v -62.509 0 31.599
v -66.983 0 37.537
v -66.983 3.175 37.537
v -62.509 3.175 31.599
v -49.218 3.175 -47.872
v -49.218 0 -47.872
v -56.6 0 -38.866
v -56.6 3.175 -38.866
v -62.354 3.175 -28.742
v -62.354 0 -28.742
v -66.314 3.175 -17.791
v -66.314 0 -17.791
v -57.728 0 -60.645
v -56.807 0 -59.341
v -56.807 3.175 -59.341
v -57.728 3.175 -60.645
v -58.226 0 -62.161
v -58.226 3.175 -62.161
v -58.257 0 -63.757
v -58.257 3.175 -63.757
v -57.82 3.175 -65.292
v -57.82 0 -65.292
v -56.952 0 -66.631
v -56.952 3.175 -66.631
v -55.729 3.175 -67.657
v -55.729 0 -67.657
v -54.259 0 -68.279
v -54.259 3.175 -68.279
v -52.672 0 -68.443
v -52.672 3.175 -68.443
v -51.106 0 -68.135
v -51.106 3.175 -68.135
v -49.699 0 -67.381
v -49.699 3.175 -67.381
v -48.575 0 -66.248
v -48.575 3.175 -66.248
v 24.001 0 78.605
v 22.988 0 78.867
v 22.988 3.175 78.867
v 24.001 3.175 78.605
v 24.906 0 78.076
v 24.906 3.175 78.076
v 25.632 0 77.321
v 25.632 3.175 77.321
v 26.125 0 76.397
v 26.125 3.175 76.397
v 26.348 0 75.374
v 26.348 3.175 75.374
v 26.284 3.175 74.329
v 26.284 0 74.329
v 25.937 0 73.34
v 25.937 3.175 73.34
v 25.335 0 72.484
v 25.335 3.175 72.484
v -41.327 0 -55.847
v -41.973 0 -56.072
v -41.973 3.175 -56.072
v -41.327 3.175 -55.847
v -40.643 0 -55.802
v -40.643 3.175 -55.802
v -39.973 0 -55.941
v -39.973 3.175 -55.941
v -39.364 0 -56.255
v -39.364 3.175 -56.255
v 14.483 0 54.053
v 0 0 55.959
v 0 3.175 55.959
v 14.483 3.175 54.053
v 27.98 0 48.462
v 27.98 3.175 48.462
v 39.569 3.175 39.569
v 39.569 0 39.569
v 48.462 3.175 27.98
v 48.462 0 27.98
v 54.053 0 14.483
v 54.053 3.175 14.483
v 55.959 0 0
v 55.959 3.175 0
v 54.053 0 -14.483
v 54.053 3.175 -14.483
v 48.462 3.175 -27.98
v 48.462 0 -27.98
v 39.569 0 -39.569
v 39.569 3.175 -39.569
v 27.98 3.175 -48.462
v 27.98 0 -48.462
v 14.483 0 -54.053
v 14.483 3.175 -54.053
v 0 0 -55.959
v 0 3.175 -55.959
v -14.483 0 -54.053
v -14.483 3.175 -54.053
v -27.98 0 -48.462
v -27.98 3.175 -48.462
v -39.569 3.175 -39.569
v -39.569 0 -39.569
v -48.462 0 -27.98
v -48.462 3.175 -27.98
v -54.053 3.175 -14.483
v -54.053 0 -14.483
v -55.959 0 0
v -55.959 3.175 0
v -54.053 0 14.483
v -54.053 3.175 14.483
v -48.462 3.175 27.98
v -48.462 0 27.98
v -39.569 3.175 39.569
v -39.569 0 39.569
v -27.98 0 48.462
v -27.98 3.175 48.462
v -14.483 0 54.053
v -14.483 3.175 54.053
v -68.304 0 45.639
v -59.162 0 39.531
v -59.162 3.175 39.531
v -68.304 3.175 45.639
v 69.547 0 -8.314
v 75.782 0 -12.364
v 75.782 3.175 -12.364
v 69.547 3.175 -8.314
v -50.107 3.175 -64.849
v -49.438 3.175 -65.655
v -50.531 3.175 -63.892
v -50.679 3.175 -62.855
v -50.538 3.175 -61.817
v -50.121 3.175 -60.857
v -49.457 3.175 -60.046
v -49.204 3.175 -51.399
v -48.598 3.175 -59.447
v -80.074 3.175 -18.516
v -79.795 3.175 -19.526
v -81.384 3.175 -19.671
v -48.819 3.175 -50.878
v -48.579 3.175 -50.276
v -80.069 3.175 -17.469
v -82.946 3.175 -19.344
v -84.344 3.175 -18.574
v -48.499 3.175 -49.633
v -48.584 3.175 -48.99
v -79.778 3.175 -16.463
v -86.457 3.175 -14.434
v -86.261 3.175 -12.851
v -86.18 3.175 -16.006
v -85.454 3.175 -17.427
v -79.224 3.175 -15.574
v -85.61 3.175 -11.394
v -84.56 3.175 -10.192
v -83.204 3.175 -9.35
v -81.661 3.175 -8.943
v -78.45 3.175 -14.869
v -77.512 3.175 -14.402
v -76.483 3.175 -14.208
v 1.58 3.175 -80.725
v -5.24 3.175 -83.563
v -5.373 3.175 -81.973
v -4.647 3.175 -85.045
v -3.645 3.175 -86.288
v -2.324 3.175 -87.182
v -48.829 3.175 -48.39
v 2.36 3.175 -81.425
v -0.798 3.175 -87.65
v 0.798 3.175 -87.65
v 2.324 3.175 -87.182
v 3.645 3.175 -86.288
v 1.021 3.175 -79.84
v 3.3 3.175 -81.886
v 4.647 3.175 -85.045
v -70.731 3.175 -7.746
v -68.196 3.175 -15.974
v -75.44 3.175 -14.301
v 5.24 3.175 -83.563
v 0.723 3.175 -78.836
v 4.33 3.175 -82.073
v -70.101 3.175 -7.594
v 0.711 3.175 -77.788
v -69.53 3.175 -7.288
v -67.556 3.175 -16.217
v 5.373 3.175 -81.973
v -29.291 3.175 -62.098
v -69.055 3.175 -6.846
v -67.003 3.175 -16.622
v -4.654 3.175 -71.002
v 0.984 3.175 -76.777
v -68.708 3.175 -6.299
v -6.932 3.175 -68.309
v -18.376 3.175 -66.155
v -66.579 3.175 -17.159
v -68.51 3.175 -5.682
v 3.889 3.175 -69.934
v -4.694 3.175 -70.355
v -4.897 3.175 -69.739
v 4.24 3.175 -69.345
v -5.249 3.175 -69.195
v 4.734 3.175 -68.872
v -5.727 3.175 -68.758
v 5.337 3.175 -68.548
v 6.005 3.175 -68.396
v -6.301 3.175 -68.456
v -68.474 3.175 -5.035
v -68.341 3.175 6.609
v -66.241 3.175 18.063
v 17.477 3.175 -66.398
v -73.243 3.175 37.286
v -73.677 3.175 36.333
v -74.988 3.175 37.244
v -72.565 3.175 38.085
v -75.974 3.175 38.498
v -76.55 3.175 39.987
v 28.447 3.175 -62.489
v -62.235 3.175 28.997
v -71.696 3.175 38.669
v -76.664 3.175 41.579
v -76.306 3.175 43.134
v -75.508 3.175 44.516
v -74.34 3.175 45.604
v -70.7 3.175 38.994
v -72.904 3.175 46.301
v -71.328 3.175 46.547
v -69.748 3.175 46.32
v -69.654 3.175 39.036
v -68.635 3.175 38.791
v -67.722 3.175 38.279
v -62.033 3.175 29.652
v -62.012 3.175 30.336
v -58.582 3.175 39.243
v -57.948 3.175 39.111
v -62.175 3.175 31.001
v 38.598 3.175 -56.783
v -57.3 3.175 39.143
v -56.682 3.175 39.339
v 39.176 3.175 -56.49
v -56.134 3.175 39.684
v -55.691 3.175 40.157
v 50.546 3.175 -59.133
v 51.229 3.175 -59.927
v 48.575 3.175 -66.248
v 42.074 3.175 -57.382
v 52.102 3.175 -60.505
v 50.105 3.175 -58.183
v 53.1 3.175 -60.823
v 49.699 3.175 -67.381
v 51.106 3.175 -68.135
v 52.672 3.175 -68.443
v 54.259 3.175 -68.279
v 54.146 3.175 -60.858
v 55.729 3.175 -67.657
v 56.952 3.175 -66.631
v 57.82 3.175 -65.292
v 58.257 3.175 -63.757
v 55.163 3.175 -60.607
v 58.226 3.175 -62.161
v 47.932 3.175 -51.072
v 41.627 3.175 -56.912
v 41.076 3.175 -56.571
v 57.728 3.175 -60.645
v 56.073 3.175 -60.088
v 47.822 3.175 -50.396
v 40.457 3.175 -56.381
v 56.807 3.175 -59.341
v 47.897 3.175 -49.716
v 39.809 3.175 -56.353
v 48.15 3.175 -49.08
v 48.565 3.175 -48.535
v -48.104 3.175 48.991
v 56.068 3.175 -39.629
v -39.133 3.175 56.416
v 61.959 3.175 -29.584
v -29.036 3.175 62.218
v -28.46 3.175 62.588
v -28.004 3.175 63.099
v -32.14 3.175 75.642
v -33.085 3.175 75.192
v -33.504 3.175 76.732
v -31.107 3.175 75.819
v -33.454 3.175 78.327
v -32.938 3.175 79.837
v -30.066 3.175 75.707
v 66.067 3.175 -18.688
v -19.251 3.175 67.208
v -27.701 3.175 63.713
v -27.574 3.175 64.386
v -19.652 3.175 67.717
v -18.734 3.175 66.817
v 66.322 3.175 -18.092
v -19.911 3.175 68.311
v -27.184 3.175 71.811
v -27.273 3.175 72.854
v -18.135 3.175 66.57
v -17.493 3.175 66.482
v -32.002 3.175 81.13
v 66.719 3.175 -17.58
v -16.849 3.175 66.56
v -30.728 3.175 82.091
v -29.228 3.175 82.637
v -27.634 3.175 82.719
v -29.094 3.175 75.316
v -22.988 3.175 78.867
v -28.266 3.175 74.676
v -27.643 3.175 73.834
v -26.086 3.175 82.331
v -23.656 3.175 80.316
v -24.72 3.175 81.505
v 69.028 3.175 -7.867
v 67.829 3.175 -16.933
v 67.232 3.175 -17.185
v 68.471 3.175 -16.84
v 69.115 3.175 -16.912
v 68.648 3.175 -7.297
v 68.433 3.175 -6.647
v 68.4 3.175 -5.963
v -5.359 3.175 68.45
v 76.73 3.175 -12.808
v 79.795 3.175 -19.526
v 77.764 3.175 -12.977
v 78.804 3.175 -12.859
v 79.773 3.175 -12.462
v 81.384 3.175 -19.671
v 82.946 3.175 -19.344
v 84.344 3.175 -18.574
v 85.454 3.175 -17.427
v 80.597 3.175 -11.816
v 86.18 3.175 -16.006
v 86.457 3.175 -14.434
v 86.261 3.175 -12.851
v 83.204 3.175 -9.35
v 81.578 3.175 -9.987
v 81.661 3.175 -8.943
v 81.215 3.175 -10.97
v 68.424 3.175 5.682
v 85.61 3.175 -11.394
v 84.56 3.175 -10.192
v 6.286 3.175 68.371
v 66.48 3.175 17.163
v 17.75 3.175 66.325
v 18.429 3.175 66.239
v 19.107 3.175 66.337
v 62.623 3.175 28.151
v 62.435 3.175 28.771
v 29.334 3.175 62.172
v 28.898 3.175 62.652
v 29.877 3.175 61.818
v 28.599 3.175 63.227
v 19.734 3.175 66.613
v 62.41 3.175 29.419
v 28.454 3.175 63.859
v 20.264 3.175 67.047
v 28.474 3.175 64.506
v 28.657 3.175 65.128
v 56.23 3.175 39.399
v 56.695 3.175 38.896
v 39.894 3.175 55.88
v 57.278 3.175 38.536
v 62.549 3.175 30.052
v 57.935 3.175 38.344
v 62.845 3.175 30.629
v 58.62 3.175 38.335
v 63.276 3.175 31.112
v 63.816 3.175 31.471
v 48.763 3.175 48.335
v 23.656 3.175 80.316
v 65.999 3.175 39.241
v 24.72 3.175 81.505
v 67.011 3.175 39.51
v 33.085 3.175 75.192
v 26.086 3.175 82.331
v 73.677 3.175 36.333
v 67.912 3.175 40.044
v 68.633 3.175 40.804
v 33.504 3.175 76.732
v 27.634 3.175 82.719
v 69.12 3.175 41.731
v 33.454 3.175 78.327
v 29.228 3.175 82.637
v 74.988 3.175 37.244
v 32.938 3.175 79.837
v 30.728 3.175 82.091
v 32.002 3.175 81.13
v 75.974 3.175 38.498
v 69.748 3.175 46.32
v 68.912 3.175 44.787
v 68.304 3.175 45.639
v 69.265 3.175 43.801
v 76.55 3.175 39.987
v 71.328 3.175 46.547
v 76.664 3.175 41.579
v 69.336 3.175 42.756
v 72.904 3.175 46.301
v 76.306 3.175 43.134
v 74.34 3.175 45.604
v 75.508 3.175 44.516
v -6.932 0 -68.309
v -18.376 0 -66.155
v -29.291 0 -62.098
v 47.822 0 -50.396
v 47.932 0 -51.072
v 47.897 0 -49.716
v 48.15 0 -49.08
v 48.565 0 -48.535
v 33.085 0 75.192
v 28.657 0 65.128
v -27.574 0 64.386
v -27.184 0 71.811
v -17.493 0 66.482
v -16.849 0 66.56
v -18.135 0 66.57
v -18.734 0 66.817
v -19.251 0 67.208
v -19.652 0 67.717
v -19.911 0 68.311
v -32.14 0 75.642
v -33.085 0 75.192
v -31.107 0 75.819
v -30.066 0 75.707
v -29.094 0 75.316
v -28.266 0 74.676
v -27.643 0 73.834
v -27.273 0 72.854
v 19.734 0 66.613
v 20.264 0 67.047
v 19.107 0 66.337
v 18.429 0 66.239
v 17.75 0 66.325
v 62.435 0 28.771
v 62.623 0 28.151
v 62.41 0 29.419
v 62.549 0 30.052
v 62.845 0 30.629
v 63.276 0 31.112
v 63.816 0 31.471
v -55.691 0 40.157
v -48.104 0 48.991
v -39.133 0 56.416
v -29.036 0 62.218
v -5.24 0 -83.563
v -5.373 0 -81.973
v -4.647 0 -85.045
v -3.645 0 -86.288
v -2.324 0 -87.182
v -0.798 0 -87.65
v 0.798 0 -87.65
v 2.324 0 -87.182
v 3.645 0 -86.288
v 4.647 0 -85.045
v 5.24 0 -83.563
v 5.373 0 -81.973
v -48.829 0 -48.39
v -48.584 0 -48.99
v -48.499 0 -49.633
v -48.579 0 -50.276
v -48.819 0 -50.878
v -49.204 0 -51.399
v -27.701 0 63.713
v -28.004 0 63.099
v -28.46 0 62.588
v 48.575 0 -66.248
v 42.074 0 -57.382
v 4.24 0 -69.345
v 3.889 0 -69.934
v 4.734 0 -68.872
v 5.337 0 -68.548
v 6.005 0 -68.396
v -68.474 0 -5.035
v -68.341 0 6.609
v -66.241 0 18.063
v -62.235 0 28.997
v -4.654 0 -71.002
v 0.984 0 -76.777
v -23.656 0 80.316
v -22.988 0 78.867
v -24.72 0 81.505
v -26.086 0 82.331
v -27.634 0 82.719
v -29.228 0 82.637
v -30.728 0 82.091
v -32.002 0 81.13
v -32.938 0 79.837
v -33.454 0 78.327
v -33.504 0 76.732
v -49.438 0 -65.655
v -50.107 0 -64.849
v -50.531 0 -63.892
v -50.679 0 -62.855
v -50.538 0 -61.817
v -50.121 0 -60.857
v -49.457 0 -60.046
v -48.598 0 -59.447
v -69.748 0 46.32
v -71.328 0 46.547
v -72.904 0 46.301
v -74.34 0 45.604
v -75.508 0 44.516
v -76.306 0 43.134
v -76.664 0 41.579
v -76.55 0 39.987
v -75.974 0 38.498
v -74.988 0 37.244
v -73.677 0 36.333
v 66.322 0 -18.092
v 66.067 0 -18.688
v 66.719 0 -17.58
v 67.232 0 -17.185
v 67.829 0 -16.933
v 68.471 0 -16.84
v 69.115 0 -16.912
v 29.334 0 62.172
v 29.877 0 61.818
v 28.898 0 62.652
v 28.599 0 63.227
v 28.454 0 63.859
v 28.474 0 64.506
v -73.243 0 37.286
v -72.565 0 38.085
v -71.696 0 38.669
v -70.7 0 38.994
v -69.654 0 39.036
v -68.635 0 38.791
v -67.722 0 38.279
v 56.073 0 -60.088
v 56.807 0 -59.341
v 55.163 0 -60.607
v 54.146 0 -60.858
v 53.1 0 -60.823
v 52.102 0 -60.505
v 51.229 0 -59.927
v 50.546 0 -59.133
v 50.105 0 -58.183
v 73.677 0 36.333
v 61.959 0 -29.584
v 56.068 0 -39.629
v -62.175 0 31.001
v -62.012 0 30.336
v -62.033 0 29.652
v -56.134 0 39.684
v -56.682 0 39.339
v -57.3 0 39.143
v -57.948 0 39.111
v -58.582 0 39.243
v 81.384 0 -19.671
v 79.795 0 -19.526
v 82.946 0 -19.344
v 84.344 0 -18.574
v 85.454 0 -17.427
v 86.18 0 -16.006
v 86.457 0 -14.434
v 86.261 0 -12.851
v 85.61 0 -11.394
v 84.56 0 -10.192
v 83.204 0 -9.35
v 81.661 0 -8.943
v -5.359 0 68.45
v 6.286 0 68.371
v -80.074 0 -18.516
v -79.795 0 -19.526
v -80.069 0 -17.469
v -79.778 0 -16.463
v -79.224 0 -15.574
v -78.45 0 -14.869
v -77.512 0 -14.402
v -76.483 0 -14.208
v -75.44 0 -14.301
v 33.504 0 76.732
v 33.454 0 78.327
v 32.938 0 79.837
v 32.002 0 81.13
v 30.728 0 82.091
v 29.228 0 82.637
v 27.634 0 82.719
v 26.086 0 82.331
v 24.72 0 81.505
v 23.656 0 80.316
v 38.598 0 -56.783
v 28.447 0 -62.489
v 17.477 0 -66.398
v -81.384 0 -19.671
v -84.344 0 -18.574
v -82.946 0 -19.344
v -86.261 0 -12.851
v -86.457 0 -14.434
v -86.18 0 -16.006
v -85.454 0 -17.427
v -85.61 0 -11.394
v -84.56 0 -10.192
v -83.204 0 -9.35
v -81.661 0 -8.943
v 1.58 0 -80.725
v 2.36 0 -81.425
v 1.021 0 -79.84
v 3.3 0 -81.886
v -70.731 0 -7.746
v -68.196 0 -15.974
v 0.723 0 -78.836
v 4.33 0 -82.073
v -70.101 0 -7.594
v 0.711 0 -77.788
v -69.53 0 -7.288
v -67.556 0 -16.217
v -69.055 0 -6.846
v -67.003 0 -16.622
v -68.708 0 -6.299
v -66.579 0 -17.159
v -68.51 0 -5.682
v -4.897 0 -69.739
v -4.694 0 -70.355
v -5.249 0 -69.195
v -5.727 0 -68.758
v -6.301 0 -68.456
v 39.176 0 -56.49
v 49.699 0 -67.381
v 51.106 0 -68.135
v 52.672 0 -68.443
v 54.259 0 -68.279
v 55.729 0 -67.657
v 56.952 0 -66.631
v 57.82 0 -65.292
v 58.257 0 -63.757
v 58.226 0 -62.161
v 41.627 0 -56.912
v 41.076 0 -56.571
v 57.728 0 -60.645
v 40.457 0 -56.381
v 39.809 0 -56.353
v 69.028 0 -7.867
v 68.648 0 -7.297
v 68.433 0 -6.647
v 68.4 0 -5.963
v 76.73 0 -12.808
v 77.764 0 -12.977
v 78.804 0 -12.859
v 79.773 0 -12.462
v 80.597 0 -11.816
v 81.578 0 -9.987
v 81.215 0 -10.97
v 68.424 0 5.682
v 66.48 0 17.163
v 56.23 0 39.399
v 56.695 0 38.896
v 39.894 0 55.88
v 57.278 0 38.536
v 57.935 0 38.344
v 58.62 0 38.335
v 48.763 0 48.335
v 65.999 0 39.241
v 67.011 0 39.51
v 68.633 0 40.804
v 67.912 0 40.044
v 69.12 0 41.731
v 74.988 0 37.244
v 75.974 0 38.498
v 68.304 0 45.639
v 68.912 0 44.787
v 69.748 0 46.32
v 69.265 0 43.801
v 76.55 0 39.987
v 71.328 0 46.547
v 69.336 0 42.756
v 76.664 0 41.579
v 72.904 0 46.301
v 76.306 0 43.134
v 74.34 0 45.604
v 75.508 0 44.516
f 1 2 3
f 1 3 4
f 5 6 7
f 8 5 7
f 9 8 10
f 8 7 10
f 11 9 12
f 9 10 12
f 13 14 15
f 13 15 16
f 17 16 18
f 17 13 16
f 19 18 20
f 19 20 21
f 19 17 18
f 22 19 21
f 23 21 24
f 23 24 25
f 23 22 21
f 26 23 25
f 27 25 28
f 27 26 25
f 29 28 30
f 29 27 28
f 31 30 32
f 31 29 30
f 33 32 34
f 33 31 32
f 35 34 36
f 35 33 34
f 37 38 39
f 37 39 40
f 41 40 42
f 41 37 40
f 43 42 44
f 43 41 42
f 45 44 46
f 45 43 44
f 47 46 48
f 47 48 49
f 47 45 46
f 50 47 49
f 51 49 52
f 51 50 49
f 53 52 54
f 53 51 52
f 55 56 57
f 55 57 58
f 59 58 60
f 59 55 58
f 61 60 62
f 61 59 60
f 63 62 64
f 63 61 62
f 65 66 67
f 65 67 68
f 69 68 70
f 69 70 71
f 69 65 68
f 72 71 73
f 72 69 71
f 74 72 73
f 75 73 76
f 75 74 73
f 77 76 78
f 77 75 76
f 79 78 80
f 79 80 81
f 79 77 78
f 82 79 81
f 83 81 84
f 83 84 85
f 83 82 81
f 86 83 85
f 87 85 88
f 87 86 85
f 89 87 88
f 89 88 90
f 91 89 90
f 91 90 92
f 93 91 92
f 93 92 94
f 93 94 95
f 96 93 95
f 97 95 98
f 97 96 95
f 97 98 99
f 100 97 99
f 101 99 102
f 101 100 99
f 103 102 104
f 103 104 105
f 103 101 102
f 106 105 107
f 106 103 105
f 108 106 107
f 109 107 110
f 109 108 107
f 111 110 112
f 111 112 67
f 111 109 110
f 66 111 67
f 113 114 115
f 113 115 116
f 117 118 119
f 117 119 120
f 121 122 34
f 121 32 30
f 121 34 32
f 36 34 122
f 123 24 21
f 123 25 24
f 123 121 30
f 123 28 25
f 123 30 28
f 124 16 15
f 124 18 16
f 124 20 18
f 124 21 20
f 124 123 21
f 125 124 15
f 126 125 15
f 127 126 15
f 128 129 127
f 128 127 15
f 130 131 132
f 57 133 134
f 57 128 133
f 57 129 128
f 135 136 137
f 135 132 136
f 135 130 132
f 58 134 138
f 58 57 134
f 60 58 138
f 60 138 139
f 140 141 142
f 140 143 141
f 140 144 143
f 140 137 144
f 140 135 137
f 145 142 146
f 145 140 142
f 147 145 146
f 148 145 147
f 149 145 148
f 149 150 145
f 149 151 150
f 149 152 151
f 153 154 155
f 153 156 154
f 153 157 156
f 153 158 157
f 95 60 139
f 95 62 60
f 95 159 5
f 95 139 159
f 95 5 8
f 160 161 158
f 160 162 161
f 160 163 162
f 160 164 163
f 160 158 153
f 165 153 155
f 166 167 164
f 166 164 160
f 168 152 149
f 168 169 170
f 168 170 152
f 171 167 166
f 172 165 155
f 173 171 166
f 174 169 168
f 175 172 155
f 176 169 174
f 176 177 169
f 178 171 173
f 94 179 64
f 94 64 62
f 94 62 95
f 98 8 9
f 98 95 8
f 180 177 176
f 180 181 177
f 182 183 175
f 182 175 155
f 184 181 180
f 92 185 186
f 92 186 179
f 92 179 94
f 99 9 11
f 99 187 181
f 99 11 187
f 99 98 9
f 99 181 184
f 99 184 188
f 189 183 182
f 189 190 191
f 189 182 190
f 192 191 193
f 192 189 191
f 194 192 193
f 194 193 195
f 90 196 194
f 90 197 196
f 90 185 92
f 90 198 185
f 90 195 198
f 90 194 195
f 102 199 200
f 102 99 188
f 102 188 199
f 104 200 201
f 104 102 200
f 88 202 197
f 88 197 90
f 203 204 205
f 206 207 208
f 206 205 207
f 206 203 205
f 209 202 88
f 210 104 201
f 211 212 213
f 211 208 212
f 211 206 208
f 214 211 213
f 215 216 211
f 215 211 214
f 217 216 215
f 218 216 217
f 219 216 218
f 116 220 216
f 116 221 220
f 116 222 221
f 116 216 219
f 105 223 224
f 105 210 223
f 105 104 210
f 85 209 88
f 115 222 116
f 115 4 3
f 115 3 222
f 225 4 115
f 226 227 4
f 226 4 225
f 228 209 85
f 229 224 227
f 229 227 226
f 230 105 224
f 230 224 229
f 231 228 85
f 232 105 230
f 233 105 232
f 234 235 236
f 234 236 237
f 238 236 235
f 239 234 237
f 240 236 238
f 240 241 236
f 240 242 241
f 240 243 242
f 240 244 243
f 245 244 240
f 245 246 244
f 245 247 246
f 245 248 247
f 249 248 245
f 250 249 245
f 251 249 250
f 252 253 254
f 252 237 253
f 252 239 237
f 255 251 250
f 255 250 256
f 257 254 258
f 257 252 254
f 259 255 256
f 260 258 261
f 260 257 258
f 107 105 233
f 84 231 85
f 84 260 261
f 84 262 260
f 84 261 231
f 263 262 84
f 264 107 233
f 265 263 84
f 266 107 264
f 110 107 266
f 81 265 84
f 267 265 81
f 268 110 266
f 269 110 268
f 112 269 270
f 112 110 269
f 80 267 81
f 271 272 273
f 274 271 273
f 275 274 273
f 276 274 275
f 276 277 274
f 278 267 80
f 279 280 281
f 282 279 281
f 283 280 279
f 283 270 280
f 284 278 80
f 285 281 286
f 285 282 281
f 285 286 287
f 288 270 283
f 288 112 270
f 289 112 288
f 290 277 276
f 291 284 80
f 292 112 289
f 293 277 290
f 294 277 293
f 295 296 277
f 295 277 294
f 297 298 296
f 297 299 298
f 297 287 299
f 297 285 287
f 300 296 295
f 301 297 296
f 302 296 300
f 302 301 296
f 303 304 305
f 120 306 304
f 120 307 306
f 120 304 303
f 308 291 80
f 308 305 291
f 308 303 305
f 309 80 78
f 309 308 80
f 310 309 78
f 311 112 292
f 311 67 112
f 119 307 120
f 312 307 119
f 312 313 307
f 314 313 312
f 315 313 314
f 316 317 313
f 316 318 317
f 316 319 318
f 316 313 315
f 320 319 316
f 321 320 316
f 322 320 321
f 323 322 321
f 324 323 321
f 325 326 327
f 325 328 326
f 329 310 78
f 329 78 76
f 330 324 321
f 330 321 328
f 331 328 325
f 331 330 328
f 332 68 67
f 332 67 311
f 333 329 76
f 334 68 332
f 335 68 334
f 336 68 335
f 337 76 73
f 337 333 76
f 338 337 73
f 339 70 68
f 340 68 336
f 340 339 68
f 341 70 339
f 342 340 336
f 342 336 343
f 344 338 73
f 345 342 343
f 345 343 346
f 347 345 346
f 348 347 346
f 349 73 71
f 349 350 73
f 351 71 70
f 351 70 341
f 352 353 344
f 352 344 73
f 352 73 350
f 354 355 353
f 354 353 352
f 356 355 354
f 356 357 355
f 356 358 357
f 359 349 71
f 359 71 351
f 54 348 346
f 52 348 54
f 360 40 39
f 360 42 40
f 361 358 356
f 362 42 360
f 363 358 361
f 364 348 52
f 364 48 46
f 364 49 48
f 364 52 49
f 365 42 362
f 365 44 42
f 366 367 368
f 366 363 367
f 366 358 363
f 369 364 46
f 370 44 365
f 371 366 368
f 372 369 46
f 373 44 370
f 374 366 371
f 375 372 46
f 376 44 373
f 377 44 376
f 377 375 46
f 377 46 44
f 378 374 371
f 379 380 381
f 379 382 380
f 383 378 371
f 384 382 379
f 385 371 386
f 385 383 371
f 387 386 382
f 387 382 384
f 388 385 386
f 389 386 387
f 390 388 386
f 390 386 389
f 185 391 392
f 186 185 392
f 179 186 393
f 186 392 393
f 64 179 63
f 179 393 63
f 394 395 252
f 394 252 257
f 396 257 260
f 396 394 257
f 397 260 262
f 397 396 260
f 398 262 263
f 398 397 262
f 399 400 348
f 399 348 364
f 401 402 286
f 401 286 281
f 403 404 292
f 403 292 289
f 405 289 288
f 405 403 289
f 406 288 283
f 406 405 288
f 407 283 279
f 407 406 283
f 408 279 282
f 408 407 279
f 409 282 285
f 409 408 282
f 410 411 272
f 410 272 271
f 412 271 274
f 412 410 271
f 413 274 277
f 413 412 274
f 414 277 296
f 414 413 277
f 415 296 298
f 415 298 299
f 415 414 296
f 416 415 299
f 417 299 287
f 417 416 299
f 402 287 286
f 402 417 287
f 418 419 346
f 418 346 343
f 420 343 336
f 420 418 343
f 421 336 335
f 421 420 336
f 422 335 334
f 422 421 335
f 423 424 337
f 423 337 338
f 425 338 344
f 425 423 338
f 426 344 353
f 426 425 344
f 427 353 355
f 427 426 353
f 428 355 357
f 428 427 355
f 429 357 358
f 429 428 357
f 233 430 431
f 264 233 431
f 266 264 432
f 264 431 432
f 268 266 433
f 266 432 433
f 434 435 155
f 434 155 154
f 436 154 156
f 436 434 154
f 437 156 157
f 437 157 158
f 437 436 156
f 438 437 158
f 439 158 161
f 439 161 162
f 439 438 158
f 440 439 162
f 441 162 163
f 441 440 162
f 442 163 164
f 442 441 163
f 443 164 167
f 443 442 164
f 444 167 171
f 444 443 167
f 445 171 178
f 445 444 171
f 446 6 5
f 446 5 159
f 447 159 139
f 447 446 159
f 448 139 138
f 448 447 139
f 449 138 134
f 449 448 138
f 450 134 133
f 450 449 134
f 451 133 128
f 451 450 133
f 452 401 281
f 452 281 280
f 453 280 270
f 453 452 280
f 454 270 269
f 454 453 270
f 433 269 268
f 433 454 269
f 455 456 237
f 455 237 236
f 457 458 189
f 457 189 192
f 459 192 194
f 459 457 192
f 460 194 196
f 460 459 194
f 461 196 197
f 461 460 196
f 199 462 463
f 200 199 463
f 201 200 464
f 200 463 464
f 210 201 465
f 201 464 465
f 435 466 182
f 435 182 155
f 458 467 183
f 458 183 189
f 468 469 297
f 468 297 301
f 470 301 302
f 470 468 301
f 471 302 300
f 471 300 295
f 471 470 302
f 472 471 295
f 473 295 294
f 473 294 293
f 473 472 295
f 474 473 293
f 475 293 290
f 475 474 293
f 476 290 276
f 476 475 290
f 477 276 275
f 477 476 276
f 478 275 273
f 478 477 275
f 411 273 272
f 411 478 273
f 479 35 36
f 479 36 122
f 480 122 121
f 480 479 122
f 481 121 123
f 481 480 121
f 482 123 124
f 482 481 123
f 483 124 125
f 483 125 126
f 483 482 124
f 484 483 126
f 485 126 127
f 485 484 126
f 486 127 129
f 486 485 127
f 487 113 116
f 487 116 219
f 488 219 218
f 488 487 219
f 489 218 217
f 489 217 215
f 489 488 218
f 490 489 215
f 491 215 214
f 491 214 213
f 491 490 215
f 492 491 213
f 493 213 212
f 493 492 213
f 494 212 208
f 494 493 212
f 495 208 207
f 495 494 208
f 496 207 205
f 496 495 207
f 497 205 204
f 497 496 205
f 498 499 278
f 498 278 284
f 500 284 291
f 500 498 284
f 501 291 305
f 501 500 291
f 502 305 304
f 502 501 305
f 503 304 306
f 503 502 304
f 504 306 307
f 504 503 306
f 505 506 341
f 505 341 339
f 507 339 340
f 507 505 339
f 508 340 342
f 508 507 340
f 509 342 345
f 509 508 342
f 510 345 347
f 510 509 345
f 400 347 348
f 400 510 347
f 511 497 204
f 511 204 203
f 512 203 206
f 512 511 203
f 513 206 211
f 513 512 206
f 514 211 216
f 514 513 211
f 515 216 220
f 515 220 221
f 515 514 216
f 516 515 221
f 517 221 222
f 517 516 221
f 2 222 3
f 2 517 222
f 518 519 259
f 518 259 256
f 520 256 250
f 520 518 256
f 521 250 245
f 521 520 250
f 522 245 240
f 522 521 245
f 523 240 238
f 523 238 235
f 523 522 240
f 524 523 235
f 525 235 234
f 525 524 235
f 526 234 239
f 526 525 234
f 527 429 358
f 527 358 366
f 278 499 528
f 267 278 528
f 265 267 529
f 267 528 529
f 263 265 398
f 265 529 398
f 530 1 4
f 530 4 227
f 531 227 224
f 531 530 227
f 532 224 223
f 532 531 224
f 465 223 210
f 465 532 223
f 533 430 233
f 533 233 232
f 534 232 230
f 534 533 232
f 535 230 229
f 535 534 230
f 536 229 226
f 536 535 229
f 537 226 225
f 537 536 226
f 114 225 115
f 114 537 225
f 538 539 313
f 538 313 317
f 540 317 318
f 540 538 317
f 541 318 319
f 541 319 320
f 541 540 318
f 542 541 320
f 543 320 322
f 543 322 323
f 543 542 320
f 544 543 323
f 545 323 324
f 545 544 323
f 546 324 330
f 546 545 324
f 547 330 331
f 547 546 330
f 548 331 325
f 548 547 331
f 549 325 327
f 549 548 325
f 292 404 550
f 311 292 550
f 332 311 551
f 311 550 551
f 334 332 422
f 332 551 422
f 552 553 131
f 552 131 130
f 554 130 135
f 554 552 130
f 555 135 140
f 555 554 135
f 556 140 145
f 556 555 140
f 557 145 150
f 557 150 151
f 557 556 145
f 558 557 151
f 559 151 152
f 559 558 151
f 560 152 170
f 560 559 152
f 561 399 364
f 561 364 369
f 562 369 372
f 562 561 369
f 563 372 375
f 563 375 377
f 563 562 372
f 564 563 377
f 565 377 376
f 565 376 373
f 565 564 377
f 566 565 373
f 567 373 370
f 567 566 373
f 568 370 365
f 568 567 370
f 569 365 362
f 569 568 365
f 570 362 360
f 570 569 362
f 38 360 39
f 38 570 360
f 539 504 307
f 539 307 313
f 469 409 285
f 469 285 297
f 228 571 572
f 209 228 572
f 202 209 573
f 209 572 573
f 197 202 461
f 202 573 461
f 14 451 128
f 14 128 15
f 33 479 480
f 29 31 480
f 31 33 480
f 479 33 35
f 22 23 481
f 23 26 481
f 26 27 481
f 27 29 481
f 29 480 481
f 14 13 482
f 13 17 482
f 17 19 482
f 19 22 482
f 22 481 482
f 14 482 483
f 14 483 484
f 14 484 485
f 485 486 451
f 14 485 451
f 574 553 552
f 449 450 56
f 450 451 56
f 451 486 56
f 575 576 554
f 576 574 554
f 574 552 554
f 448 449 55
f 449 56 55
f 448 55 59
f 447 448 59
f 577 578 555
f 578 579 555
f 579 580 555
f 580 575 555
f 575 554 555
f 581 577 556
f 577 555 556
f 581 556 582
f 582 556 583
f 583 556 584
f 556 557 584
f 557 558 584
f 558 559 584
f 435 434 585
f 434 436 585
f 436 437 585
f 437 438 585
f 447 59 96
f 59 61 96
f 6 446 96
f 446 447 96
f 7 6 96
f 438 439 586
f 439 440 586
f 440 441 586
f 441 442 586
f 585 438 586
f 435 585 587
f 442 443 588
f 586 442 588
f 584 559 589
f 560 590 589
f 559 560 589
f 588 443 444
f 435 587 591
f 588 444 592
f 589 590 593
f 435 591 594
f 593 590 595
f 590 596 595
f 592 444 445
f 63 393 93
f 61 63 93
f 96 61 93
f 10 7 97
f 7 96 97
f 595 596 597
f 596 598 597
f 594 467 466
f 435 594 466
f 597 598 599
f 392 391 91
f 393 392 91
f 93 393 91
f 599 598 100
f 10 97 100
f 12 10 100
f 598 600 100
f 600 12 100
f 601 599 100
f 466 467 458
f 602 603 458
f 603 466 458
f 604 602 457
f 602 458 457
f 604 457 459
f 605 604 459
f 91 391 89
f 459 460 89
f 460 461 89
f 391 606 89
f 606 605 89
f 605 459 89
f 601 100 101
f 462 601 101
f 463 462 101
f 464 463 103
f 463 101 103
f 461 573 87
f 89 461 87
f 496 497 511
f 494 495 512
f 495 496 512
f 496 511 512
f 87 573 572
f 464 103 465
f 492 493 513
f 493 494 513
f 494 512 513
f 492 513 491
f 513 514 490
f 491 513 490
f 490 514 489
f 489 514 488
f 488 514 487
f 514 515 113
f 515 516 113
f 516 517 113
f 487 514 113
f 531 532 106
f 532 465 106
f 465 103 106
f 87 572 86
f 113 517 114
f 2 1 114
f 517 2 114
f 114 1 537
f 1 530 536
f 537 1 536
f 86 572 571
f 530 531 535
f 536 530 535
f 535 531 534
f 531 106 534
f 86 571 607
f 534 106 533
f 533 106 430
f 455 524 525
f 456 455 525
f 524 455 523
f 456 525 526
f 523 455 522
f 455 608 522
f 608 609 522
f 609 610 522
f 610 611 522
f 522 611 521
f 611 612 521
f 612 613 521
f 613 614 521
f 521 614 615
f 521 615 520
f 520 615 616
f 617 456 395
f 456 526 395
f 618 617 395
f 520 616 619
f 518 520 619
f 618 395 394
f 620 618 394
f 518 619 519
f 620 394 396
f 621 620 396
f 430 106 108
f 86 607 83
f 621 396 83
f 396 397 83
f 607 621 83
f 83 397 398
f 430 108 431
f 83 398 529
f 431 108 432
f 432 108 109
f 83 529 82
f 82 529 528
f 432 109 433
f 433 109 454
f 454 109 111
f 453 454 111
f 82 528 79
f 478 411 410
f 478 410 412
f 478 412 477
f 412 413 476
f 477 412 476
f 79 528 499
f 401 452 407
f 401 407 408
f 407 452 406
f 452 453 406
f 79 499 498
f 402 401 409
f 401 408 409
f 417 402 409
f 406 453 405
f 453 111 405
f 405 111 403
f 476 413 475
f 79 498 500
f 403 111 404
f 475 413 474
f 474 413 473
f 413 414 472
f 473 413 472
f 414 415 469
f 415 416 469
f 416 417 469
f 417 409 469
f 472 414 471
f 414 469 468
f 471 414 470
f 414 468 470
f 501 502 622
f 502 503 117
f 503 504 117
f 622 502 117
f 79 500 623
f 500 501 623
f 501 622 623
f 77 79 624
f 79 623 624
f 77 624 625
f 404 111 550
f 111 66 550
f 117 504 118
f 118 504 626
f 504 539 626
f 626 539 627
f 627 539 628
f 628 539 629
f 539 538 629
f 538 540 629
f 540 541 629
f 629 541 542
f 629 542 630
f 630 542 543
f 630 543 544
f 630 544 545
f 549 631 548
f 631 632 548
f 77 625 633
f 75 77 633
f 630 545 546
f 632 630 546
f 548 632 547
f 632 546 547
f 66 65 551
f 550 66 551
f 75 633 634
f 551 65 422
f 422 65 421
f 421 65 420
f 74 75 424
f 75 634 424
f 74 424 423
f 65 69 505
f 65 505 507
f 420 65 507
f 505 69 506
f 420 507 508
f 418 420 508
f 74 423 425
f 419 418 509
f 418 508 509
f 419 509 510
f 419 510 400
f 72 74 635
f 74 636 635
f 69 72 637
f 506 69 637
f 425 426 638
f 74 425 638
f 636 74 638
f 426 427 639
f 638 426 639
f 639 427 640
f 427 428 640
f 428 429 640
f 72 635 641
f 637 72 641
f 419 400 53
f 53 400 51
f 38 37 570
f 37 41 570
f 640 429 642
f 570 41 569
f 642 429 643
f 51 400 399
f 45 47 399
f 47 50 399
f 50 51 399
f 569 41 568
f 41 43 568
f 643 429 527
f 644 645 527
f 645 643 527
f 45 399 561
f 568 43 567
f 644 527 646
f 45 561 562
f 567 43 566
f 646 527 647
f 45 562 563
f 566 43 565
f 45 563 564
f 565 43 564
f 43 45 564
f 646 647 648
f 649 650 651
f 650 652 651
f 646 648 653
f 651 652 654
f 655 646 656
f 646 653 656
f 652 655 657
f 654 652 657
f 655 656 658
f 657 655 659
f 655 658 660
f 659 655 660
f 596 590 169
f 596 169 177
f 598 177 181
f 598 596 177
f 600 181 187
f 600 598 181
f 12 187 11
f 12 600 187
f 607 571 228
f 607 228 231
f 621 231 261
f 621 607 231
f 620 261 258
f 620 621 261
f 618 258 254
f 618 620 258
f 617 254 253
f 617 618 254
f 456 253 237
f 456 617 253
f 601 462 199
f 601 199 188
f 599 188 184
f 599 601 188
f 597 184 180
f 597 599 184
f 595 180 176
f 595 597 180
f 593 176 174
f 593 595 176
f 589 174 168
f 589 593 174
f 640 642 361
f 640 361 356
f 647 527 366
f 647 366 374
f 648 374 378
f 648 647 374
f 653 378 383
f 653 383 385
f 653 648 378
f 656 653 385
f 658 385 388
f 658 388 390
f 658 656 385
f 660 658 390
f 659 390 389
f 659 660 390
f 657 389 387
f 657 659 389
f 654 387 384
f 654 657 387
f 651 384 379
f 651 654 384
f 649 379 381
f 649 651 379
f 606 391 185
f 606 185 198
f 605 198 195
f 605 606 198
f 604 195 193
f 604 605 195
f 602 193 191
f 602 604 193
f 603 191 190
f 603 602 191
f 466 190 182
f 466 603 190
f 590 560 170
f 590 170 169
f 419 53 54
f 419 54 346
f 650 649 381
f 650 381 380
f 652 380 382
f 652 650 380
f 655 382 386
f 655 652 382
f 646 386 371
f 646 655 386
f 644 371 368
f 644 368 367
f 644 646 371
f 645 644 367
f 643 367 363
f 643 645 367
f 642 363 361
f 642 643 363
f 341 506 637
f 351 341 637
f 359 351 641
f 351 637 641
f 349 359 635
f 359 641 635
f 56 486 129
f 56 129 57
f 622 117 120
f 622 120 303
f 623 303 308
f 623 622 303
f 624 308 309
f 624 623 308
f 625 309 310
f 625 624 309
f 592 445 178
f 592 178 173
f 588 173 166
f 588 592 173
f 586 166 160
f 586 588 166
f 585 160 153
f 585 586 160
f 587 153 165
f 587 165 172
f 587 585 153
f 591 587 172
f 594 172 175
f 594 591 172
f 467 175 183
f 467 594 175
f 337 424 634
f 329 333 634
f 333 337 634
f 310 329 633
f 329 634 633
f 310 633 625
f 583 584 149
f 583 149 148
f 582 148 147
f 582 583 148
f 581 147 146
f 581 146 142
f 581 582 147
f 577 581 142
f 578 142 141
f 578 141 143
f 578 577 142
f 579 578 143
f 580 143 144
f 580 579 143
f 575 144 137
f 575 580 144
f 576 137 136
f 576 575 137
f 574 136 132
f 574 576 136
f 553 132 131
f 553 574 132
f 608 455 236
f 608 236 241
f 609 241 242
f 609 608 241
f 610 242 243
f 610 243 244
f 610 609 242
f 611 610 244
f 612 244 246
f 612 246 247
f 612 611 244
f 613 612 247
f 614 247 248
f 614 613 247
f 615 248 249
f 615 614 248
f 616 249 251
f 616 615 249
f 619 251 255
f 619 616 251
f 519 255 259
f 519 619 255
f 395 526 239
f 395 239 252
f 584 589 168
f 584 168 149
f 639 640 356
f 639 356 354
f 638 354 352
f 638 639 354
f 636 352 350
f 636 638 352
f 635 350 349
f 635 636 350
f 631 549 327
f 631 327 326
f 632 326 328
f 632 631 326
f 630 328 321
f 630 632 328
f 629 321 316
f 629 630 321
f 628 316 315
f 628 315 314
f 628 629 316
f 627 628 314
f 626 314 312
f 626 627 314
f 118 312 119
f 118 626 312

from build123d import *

# Parameters (mm, degrees)
SKETCH1_R           = 68.659375
SKETCH1_R_2         = 55.959375
BOSS_EXTRUDE1_DEPTH = 3.175
BOSS_EXTRUDE2_START = -3.175
BOSS_EXTRUDE2_DEPTH = 3.175
CIRPATTERN1_COUNT   = 9


with BuildPart() as part:
    # Sketch1 → Boss-Extrude1 (new body)
    with BuildSketch(Plane(origin=(0, 0, 0), x_dir=(1, 0, 0), z_dir=(0, 1, 0))):
        with Locations(Location((0, 0, 0), (0, 0, 270))):
            Circle(SKETCH1_R)
        with Locations(Location((0, 0, 0), (0, 0, 270))):
            Circle(SKETCH1_R_2, mode=Mode.SUBTRACT)
    extrude(amount=BOSS_EXTRUDE1_DEPTH)

    # Sketch2 → Boss-Extrude2 (add)
    with BuildSketch(Plane(origin=(0, 3.175, 0), x_dir=(1, 0, 0), z_dir=(0, 1, 0)).offset(BOSS_EXTRUDE2_START)):
        with BuildLine():
            Line((-4.653697789, 71.001707707), (-5.372788209, 81.972907412))
            ThreePointArc((-5.372788209, 81.972907412), (0, 87.709375), (5.372788209, 81.972907412))
            ThreePointArc((5.372788209, 81.972907412), (1.580107525, 80.725221164), (0.983574692, 76.777399446))
            Line((0.983574692, 76.777399446), (3.889375, 69.933810414))
            ThreePointArc((3.889375, 69.933810414), (4.734169071, 68.871766239), (6.005193091, 68.39625305))
            ThreePointArc((6.005193091, 68.39625305), (-0.46538454, 68.657797755), (-6.931822104, 68.308561818))
            ThreePointArc((-6.931822104, 68.308561818), (-5.249012804, 69.195180628), (-4.653697789, 71.001707707))
        make_face()
    boss_extrude2 = extrude(amount=BOSS_EXTRUDE2_DEPTH)

    # CirPattern1: Boss-Extrude2 ×9 about axis
    cirpattern1_axis = Axis((0, 0, 0), (0, 1, 0))
    for i in range(1, CIRPATTERN1_COUNT):
        add(boss_extrude2.rotate(cirpattern1_axis, i * 360 / CIRPATTERN1_COUNT))


solid = part.part
